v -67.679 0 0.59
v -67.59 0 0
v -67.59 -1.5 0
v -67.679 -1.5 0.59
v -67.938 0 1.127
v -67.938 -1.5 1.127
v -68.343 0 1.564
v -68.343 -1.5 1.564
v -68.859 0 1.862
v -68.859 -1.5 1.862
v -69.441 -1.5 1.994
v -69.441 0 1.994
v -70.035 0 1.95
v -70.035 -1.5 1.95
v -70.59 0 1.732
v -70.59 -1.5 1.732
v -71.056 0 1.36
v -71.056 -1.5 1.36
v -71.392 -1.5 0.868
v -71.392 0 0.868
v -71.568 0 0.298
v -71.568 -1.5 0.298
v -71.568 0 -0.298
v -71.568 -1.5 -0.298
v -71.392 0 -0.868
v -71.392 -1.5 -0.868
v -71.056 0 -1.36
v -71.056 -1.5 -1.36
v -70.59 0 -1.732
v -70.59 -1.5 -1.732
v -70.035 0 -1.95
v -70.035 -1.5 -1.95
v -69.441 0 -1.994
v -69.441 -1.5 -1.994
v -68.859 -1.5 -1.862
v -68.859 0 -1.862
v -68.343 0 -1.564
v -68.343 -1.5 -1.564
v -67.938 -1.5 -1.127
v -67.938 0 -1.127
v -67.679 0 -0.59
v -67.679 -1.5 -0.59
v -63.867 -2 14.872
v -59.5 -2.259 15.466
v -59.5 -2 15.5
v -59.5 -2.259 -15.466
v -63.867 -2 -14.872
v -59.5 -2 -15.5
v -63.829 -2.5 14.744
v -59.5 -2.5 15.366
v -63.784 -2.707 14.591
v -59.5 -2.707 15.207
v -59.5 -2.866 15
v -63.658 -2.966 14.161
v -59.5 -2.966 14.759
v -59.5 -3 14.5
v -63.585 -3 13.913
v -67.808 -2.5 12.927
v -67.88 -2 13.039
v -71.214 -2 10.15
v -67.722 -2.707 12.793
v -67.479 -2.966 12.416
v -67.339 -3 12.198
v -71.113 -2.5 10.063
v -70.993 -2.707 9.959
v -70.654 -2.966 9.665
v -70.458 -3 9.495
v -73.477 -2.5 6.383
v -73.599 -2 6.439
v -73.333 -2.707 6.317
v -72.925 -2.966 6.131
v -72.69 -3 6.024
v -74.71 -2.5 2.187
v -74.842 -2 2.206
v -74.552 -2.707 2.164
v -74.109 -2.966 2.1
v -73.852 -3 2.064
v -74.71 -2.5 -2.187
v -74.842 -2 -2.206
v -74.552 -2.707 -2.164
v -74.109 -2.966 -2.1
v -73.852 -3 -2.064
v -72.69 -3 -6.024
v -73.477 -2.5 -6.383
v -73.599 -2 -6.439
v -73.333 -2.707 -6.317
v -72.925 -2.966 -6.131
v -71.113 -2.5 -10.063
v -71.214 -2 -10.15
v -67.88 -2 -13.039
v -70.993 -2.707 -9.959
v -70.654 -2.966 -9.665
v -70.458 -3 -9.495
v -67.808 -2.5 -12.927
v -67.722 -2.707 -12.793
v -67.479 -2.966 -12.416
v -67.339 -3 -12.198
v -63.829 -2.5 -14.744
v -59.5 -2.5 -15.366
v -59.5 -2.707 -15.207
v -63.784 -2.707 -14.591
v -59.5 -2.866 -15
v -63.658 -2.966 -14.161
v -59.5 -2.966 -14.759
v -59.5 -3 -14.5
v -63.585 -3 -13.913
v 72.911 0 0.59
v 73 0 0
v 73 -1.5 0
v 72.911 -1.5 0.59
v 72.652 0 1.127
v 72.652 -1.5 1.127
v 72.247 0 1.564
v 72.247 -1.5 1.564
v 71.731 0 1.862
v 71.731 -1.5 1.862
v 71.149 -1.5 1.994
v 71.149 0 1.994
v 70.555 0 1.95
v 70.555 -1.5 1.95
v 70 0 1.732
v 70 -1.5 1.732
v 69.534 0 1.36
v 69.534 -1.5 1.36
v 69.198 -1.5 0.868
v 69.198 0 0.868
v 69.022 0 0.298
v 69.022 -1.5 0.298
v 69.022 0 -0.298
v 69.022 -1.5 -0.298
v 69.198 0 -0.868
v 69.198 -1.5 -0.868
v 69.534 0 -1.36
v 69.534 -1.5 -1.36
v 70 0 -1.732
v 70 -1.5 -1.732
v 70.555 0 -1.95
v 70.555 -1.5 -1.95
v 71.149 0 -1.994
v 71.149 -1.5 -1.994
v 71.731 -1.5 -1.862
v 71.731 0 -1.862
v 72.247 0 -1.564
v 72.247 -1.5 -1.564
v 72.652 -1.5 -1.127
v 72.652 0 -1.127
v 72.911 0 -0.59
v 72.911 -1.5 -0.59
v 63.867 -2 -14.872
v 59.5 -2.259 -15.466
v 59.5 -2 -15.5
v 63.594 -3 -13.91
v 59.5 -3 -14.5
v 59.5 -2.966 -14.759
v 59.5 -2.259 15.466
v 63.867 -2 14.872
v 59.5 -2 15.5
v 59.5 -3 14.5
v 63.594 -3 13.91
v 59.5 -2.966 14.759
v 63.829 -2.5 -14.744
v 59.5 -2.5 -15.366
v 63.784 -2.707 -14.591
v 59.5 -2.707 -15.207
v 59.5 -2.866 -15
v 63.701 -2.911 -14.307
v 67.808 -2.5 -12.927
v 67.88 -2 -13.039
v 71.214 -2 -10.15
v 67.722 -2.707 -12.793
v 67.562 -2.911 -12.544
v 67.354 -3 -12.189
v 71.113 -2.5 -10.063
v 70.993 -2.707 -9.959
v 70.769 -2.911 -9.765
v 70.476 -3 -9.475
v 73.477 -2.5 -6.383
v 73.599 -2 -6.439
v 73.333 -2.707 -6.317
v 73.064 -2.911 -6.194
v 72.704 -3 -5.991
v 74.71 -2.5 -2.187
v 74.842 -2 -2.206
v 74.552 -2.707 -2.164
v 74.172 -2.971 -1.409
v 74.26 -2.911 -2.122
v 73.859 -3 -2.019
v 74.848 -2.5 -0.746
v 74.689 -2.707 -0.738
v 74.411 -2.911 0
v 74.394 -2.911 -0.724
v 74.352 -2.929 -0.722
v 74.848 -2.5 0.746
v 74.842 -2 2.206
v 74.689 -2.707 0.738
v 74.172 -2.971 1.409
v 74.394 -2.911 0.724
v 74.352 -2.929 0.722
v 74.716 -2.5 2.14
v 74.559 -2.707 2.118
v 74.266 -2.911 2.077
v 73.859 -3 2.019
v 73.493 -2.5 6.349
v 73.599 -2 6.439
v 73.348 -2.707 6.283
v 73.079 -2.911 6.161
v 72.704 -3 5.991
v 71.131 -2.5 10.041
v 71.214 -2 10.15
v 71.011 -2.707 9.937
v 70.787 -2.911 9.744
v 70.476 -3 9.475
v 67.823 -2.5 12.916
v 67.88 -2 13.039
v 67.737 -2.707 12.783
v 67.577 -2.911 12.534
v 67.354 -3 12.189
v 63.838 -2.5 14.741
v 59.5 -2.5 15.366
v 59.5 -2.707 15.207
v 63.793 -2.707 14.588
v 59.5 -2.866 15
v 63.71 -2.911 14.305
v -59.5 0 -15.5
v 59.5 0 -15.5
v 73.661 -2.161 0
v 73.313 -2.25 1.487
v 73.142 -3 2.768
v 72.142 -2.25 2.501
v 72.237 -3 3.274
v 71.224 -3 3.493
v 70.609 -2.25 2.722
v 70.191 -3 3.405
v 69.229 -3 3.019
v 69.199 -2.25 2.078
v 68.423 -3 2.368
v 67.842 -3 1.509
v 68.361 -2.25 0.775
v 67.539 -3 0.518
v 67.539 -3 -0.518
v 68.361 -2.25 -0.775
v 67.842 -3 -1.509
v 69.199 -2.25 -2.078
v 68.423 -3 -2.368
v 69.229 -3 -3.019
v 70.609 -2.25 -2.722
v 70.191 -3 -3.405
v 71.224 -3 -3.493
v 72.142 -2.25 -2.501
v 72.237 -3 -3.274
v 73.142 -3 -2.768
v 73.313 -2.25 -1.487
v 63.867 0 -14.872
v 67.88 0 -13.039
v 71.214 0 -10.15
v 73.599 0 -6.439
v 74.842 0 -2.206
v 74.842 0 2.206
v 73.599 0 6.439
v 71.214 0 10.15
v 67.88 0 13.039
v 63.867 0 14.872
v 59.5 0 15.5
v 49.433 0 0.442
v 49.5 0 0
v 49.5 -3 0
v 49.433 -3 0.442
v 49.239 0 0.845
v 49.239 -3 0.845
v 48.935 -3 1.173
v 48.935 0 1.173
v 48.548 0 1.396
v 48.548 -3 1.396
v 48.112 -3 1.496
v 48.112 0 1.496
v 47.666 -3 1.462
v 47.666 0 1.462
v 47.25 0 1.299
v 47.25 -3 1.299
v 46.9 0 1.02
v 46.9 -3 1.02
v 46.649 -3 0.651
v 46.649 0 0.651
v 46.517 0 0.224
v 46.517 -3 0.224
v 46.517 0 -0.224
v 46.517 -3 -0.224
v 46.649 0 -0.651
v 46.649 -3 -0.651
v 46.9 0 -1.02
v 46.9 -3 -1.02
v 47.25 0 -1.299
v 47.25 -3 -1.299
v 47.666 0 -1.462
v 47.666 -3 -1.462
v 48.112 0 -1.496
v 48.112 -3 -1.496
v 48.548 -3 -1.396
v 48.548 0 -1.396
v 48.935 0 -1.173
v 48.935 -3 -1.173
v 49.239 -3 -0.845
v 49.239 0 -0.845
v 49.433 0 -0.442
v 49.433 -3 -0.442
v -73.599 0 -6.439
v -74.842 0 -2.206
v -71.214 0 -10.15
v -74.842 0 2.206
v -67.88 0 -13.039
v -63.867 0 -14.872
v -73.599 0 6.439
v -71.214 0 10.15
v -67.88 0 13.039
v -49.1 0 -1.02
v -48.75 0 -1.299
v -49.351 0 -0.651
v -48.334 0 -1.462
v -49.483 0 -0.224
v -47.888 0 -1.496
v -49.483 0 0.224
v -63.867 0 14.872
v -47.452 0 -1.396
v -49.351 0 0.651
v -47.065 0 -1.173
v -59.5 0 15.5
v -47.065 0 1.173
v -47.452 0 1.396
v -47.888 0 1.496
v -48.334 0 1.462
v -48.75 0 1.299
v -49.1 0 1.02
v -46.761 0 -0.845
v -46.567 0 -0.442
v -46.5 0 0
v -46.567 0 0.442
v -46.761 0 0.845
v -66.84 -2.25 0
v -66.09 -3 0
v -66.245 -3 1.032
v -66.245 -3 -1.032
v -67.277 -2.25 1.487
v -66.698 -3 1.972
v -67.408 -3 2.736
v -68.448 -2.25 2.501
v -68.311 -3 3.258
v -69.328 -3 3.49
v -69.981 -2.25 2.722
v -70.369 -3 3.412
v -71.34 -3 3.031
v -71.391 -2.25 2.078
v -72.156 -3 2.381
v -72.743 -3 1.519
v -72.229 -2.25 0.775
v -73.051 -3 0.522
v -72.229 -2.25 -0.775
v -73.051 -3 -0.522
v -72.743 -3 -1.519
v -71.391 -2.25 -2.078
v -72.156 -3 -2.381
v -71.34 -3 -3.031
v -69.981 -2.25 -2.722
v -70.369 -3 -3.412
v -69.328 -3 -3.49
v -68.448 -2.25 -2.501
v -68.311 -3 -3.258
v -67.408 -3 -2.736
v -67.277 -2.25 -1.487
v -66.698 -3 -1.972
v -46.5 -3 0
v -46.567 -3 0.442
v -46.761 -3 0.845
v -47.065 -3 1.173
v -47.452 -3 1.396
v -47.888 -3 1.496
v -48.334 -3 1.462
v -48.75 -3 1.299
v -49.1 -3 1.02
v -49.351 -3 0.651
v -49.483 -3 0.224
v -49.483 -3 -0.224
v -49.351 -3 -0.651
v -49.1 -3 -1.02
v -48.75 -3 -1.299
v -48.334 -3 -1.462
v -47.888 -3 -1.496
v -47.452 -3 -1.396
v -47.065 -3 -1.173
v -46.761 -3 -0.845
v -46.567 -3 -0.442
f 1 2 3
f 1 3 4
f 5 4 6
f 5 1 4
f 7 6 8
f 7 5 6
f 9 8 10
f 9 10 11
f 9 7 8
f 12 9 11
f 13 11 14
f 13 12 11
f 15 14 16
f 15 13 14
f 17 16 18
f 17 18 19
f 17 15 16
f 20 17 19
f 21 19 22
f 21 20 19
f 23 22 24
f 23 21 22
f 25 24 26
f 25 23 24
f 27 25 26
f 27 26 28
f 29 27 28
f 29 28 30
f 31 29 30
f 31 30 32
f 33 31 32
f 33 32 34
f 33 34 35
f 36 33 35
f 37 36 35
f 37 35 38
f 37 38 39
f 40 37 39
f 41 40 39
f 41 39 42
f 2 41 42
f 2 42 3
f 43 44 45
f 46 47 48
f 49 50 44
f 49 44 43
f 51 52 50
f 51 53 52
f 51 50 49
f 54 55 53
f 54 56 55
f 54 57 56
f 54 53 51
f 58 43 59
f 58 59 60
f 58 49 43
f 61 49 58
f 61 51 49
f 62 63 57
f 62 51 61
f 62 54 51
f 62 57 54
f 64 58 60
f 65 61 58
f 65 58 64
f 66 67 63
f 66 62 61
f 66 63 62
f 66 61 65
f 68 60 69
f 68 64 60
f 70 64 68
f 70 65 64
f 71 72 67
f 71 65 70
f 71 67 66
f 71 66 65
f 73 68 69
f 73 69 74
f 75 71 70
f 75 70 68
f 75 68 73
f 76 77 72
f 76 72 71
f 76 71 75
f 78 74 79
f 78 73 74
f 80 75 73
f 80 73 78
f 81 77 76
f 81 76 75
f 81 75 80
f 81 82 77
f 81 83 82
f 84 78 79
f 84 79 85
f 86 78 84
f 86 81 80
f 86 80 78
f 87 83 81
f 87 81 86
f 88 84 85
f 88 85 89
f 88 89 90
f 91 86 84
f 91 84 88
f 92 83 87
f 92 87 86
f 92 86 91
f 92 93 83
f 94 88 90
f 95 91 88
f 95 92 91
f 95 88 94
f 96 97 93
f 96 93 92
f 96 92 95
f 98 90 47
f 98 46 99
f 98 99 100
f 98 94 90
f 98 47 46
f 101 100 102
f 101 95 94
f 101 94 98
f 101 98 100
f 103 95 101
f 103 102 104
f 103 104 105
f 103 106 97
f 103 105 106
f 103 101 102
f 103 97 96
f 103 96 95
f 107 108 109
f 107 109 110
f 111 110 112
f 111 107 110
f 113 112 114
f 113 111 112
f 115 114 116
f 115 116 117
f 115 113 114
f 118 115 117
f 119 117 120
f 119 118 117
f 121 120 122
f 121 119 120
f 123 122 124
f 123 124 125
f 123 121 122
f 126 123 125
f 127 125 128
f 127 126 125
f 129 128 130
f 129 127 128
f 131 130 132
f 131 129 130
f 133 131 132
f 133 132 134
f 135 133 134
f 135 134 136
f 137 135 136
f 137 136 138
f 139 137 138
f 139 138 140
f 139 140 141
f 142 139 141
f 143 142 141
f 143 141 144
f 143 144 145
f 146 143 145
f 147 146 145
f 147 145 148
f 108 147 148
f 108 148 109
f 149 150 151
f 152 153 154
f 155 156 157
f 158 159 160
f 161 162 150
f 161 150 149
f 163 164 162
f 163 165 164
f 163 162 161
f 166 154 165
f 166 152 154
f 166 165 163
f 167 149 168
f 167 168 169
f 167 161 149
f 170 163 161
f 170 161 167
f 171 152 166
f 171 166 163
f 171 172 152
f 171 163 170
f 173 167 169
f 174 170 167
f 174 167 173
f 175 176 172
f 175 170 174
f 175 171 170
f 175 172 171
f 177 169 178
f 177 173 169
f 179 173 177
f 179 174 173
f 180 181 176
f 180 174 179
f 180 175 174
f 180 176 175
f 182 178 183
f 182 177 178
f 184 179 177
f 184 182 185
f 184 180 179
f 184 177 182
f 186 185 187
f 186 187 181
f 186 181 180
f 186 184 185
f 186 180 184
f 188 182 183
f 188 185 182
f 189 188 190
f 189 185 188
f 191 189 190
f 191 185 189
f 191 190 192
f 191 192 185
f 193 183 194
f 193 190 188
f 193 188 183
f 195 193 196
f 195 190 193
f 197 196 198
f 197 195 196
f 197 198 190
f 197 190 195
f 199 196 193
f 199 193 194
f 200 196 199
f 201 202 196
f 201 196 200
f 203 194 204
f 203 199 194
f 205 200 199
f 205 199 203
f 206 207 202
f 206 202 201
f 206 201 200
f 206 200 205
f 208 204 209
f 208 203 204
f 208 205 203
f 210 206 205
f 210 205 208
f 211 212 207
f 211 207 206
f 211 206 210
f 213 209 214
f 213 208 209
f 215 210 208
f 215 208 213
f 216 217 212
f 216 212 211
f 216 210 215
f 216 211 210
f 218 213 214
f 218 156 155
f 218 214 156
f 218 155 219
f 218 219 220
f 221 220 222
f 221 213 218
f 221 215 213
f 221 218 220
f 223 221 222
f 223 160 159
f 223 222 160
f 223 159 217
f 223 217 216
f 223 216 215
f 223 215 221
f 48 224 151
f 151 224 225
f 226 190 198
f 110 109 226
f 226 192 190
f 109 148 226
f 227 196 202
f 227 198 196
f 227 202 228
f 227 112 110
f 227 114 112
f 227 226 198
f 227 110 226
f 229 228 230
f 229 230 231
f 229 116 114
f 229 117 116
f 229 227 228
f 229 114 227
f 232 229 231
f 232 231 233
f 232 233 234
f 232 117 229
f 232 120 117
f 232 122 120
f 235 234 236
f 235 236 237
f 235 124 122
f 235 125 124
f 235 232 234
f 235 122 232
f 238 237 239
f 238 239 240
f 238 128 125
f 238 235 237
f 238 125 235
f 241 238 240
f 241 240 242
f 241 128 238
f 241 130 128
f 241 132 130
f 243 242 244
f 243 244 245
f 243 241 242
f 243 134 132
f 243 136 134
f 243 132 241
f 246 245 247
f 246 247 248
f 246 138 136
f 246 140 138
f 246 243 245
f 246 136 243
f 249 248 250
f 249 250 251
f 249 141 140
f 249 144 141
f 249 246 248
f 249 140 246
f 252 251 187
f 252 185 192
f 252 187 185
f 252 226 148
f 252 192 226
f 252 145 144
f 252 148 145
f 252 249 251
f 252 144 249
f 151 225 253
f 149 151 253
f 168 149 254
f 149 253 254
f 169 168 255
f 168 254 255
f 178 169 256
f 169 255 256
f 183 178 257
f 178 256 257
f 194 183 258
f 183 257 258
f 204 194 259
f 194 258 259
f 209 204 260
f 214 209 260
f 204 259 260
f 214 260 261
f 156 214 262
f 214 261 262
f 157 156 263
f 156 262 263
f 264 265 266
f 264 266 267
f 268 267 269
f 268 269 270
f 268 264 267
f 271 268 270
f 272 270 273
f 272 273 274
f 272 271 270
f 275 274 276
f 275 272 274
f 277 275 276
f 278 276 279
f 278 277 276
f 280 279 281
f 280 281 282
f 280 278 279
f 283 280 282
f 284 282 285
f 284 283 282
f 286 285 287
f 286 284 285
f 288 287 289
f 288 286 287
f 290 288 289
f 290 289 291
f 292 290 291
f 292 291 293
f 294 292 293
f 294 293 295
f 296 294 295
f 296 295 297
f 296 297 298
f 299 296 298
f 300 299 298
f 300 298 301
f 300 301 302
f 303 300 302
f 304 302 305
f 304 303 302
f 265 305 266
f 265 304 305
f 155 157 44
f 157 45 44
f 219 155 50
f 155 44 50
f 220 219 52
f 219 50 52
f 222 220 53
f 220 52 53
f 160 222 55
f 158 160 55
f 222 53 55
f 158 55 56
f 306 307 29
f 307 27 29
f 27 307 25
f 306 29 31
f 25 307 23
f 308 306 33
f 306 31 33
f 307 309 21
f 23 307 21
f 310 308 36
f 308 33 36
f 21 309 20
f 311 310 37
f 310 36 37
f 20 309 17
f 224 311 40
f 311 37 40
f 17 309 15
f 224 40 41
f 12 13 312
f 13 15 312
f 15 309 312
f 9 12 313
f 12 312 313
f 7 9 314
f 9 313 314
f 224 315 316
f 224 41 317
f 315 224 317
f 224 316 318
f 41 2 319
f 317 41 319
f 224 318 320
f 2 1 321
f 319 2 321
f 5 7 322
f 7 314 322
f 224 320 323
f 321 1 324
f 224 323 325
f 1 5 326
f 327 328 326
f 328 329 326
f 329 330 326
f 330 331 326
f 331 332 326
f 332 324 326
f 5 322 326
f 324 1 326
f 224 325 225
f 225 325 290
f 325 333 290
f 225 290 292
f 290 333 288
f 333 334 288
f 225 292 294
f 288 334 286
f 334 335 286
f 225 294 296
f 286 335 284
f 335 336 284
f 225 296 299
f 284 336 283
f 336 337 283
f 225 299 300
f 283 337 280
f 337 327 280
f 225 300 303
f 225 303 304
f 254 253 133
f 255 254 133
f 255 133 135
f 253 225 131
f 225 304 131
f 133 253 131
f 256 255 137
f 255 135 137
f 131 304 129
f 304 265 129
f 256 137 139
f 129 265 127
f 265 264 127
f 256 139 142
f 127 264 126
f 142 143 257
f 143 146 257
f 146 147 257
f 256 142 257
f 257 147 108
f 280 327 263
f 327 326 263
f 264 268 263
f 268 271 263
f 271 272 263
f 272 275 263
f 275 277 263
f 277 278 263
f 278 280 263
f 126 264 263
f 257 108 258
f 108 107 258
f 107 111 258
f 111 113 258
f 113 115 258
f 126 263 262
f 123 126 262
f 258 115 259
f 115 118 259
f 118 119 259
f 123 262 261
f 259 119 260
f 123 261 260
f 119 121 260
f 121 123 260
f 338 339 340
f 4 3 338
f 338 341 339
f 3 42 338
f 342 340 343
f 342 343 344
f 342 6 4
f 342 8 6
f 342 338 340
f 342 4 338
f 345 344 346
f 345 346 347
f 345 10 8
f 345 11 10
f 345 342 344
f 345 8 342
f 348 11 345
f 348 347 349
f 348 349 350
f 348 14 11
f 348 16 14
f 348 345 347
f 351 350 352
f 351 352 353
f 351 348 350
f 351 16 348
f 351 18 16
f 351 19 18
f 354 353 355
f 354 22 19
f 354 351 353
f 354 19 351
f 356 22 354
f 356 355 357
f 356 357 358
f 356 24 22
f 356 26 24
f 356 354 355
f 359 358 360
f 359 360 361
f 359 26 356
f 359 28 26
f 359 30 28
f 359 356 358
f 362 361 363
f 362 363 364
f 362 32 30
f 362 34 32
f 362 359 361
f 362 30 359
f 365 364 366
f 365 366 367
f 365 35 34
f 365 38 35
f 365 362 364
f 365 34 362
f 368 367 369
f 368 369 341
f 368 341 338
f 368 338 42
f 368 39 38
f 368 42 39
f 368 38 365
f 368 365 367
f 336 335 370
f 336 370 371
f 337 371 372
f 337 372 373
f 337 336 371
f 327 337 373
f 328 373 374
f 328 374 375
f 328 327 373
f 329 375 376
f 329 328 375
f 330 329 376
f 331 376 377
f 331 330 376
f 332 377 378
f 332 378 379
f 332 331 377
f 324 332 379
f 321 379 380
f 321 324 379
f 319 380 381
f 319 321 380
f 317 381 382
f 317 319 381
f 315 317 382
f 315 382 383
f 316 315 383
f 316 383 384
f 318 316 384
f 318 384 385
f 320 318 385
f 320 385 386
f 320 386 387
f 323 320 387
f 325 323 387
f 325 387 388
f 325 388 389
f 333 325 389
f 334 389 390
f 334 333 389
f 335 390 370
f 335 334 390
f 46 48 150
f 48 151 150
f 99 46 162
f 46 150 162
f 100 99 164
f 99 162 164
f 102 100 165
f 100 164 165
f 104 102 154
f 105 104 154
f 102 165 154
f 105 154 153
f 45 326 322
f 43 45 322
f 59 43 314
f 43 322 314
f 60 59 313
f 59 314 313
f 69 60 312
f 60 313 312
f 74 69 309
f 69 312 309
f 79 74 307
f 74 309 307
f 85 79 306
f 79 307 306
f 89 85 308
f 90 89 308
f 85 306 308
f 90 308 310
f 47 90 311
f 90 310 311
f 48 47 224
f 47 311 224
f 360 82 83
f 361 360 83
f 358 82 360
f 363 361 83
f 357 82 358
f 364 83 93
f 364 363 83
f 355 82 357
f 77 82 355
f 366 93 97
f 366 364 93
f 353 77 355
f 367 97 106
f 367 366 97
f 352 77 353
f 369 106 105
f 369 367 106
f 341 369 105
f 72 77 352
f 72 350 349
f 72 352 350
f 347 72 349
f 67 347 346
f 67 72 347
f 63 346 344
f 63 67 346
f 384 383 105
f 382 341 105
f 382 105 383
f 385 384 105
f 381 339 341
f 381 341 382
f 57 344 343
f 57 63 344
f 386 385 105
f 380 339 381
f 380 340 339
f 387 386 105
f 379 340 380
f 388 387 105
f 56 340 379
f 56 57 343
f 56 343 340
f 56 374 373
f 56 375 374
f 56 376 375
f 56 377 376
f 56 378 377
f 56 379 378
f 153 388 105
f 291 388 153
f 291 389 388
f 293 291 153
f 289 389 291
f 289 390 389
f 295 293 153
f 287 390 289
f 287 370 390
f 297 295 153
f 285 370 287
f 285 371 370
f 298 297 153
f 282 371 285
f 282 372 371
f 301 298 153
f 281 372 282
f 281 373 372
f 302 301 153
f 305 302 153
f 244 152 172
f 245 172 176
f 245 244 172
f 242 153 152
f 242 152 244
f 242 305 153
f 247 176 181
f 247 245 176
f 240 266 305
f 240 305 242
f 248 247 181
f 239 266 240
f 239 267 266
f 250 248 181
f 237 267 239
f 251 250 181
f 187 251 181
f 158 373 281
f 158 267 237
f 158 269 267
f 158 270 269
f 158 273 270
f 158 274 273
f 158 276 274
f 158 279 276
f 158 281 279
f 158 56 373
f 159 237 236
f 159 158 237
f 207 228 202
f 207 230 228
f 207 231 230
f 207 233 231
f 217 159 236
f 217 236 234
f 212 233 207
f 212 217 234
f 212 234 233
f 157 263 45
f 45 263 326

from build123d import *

# Parameters (mm, degrees)
F0_R     = 2
F0_R_2   = 1.5
F1_DEPTH = 3
F2_R     = 1


# Not quite as in the source:
# - a fillet or chamfer that OpenCascade refuses, or shapes differently, is made with other operations: its cross-section is extruded or revolved along the edge and cut away or added


with BuildPart() as f1:
    # F0 (on Front) → F1 (new body)
    with BuildSketch(Plane.XZ):
        with BuildLine():
            Line((59.5, 15.5), (-59.5, 15.5))
            ThreePointArc((-59.5, 15.5), (-75, 0), (-59.5, -15.5))
            Line((-59.5, -15.5), (59.5, -15.5))
            ThreePointArc((59.5, -15.5), (75, 0), (59.5, 15.5))
        make_face()
        with Locations((-69.59, 0)):
            Circle(F0_R, mode=Mode.SUBTRACT)
        with Locations((-48, 0)):
            Circle(F0_R_2, mode=Mode.SUBTRACT)
        with Locations((48, 0)):
            Circle(F0_R_2, mode=Mode.SUBTRACT)
        with Locations((71, 0)):
            Circle(F0_R, mode=Mode.SUBTRACT)
    extrude(amount=F1_DEPTH)

    # F2
    f2_edges = [f1.edges().sort_by_distance(p)[0] for p in [
        (0, -3, 15.5),
        (-75, -3, 0),
        (0, -3, -15.5),
        (75, -3, 0),
    ]]
    fillet(f2_edges, radius=F2_R)

    # F3: chamfer of 1.5 on 2 edges, made by hand

    # F3_s1 → F3_t2 (revolve, cut)
    with BuildSketch(Plane.XY):
        Polygon((-66.09, -3), (-67.59, -1.5), (-67.59, -3), align=None)
    revolve(axis=Axis((-69.59, -3, 0), (0, -1, 0)), mode=Mode.SUBTRACT)

    # F3_s3 → F3_t4 (revolve, cut)
    with BuildSketch(Plane.XY):
        Polygon((74.5, -3), (73, -1.5), (73, -3), align=None)
    revolve(axis=Axis((71, -3, 0), (0, -1, 0)), mode=Mode.SUBTRACT)


solid = f1.part
